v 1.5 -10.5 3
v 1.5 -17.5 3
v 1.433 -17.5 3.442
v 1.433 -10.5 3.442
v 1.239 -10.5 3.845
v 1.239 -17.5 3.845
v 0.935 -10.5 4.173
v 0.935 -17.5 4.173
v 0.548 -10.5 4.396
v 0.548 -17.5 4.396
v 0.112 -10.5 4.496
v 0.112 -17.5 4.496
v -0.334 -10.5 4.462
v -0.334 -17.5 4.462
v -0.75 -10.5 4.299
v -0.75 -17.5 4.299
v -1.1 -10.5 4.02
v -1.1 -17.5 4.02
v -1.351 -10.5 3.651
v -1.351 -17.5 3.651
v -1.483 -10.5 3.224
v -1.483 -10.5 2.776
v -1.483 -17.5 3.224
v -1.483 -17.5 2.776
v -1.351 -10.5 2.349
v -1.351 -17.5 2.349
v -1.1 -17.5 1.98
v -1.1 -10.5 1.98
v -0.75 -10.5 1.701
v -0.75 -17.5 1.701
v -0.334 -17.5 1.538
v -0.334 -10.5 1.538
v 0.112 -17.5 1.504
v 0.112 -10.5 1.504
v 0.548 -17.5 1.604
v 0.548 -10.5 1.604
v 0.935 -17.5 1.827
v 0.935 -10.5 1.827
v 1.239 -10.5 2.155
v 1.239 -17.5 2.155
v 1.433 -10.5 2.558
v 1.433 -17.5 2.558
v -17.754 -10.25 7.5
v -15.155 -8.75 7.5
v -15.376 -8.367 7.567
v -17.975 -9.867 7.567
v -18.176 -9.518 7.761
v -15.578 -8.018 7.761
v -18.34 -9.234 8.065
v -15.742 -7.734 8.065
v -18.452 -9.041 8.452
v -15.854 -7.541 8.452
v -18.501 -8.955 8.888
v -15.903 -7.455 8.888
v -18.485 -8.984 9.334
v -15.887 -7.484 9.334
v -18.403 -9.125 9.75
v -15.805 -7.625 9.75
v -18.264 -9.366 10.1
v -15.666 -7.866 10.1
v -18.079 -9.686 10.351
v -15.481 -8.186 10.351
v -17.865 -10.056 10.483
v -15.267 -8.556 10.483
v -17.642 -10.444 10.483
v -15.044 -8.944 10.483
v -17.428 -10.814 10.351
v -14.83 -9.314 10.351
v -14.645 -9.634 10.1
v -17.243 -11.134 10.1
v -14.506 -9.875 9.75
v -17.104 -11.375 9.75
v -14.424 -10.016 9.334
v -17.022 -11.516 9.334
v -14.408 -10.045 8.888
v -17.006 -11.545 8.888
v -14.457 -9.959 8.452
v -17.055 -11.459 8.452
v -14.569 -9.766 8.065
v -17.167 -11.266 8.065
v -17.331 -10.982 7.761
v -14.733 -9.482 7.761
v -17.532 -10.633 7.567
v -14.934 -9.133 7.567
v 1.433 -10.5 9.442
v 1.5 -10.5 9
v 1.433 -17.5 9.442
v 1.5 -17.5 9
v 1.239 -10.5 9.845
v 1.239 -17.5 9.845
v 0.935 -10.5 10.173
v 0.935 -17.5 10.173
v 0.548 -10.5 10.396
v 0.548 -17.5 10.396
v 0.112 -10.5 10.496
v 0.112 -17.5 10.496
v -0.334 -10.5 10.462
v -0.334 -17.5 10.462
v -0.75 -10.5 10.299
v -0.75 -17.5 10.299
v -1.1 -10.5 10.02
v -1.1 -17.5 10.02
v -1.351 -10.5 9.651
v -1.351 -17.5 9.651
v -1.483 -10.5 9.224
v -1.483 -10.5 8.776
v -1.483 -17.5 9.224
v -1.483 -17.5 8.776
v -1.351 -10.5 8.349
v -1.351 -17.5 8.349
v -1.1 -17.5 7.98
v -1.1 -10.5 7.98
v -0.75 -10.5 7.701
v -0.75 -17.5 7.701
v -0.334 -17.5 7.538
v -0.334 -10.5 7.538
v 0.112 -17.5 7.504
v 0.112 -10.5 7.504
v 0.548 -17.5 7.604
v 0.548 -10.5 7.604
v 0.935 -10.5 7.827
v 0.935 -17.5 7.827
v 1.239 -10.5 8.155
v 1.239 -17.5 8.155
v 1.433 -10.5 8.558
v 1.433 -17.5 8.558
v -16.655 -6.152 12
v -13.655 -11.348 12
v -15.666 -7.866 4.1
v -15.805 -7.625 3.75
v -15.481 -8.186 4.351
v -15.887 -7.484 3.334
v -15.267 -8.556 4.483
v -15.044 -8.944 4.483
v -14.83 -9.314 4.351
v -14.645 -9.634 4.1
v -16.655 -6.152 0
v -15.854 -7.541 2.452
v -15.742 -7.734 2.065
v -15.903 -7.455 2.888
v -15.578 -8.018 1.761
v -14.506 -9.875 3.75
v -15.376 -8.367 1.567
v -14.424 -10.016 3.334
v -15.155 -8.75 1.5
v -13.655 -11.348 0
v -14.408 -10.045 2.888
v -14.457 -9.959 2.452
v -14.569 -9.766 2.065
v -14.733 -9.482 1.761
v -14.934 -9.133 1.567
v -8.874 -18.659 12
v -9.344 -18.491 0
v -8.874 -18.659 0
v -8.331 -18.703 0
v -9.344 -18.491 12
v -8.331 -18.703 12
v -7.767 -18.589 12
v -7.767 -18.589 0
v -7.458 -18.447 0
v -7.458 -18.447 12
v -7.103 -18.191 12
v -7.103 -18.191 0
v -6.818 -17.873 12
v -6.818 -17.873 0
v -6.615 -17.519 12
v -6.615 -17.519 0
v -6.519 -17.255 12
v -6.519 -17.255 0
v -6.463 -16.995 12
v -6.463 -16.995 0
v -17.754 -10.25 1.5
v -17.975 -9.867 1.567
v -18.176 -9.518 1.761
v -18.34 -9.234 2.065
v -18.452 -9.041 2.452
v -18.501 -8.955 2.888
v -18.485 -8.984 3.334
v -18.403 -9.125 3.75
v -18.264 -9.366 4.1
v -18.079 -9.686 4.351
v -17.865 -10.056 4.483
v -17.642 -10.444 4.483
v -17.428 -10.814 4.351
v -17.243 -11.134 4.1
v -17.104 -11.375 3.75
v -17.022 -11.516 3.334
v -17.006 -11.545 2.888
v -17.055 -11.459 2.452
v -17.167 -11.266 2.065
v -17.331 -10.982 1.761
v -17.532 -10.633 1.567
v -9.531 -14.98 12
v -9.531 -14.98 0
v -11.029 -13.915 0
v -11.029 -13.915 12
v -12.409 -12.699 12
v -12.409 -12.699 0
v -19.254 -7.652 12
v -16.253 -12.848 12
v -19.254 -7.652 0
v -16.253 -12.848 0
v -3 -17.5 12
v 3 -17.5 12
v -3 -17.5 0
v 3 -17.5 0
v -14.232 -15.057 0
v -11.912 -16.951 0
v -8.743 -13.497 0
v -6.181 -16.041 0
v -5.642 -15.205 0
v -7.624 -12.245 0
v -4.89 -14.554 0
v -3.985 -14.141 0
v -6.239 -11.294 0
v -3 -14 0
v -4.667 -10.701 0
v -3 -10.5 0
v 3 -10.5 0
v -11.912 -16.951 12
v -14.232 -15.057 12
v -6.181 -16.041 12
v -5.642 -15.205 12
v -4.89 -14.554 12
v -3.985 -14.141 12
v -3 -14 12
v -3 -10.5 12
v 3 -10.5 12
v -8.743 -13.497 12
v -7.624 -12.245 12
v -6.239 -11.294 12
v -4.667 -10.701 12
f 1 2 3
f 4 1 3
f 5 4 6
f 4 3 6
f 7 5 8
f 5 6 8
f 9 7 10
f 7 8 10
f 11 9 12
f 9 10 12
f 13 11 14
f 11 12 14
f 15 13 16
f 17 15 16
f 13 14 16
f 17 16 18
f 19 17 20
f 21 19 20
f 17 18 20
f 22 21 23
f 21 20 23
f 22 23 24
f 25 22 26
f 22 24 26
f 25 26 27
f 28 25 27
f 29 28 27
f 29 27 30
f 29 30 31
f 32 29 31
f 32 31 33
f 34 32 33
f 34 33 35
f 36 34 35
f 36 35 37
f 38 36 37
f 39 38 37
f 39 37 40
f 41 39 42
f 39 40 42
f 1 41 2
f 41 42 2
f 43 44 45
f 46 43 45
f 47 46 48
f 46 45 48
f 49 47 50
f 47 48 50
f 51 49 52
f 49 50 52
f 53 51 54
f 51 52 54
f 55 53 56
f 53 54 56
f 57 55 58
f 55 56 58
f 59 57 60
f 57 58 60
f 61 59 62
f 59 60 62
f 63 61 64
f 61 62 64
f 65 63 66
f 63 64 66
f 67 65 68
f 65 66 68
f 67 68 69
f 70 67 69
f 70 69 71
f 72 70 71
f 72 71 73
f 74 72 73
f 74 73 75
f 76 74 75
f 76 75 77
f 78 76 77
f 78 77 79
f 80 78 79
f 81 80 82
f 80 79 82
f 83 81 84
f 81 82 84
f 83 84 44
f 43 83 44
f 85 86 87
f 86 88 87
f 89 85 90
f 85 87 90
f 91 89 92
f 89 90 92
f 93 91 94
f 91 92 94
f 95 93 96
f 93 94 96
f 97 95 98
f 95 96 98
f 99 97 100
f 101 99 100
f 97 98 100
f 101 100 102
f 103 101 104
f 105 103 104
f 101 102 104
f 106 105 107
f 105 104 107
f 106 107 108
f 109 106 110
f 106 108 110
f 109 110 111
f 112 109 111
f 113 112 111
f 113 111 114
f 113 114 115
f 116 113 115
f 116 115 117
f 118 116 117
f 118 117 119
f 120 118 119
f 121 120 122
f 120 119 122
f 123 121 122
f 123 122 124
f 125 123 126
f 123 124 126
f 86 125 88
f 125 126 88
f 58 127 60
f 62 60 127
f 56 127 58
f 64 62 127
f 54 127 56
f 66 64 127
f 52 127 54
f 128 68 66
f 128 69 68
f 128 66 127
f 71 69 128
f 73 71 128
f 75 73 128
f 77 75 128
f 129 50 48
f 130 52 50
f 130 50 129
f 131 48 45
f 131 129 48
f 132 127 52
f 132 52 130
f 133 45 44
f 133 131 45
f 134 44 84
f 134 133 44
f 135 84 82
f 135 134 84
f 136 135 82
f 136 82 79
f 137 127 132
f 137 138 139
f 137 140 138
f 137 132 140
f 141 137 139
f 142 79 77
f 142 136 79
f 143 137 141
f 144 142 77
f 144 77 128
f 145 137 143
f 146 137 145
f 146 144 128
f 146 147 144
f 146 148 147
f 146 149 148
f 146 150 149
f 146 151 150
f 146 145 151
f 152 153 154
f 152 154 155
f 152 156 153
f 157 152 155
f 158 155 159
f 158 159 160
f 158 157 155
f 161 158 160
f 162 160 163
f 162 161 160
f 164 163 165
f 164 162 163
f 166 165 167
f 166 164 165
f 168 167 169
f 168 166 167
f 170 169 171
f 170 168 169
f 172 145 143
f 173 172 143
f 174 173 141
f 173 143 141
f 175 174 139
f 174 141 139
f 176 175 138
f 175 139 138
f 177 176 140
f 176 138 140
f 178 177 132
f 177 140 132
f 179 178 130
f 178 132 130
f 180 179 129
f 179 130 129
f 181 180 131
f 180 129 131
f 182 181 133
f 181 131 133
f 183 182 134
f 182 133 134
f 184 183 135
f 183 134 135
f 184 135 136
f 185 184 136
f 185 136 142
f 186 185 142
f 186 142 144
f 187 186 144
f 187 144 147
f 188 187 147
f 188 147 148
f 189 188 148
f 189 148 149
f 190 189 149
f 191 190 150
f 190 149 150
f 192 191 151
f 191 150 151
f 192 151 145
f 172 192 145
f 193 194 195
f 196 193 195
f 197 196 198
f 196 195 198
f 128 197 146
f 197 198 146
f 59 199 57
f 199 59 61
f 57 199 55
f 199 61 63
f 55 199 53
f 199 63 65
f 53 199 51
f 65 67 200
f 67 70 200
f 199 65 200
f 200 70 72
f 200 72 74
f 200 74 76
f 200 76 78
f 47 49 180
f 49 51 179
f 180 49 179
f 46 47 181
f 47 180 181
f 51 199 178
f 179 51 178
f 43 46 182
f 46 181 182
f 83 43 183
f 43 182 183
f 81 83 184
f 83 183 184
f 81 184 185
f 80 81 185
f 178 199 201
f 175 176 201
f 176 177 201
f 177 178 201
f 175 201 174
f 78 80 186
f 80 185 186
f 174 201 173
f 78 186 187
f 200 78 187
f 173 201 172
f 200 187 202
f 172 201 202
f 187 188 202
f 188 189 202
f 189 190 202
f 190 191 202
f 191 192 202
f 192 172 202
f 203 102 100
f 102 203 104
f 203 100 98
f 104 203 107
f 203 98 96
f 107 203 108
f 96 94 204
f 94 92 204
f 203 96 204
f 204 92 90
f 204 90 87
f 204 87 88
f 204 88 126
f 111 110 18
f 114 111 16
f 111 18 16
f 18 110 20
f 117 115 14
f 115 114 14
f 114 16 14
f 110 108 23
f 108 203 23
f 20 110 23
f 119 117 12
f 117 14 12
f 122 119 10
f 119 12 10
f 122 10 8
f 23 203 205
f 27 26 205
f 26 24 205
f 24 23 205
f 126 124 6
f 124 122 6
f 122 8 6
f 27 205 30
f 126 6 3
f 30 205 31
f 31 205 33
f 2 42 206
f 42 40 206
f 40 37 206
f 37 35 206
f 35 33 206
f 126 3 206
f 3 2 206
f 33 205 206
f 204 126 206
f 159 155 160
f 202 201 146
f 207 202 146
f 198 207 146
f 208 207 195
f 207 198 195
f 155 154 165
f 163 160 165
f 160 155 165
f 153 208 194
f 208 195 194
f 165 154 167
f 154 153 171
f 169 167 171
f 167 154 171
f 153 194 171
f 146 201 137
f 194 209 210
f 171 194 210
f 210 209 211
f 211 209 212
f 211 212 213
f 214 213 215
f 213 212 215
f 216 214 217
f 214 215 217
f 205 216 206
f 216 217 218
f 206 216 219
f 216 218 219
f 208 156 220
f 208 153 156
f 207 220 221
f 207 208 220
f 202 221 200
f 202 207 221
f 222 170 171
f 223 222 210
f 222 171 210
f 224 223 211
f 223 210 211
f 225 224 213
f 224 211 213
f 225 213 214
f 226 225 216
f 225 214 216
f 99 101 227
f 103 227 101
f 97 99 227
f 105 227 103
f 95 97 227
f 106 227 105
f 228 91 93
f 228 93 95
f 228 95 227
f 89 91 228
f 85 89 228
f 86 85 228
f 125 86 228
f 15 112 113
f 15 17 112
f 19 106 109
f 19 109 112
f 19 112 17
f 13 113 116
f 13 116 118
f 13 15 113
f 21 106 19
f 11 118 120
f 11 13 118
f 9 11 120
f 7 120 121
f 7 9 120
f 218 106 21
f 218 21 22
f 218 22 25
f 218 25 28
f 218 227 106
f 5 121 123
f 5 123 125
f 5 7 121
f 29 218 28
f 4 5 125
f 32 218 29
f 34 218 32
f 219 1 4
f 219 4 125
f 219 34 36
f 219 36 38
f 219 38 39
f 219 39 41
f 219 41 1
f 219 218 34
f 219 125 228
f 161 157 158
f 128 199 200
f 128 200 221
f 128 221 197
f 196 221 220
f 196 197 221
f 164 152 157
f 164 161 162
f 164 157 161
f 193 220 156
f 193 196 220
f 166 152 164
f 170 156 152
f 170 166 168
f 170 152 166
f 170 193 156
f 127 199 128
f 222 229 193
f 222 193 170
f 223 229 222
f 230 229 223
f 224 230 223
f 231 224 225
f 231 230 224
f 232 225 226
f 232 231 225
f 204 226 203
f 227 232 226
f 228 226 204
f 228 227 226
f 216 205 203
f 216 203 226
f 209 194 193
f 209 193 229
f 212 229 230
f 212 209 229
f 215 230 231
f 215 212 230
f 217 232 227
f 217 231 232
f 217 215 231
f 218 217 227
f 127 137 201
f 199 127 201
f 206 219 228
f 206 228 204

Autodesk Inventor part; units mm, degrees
ref_plane "YZ Plane" through (0, 0, 0) normal (1, 0, 0) x (0, 1, 0)
ref_plane "XZ Plane" through (0, 0, 0) normal (0, 1, 0) x (-1, 0, 0)
ref_plane "XY Plane" through (0, 0, 0) normal (0, 0, 1) x (1, 0, 0)
sketch "Sketch1" plane through (0, 0, 0) normal (0, 0, 1) x (1, 0, 0)
  circle A0 centre (0, 0) radius 17.5
  line L0 (-15.1554, -8.75) -> (-13.6554, -11.3481)
  line L1 (-15.1554, -8.75) -> (-16.6554, -6.1519)
  line L2 (-16.6554, -6.1519) -> (-19.2535, -7.6519)
  line L3 (-19.2535, -7.6519) -> (-16.2535, -12.8481)
  line L4 (0, 0) -> (0, -17.5)
  line L5 (0, 0) -> (15.1554, -8.75)
  line L6 (0, 0) -> (17.5, 0) construction
  line L7 (0, 0) -> (17.5, 0) construction
  line L8 (0, 17.5) -> (0, -17.5)
  line L9 (-15.1554, -8.75) -> (0, 0)
  line L10 (0, -17.5) -> (3, -17.5)
  line L11 (3, -17.5) -> (3, -20.5)
  line L12 (-3, -17.5) -> (0, -17.5)
  arc A1 (-16.2535, -12.8481) -> (-3, -20.5) centre (0, 0) ccw
  line L13 (-3, -17.5) -> (-3, -14)
  line L14 (-3, -10.5) -> (3, -10.5)
  line L15 (3, -10.5) -> (3, -17.5)
  arc A2 (-3, -10.5) -> (-9.5308, -14.9804) centre (-3, -17.5) ccw
  arc A3 (-3, -14) -> (-5.4652, -19.9845) centre (-3, -17.5) ccw
  arc A4 (-13.6554, -11.3481) -> (-9.5308, -14.9804) centre (0, 0) ccw
  arc A5 (-6.3746, -16.5715) -> (-3, -17.5) centre (0, 0) ccw
  point P0 (0, -10.5)
  point P1 (-3, -17.2409)
  point P2 (3, -17.2409)
  dimension "d0" = 35
  dimension "d1" = 3
  dimension "d2" = 3
  dimension "d3" = 3
  dimension "d4" = 330
  dimension "d6" = 35
  dimension "d8" = 3
  dimension "d9" = 3
  dimension "d10" = 6
  dimension "d11" = 3
  dimension "d29" = 7
  dimension "d30" = 6
extrude "Extrusion1" add sketch "Sketch1" along normal blind 12 contours L0 A4 A2 A0 A3 A1 L3 L2 L1 | L15 L10 A0 | A0 L4 L14 L15 | A2 L14 L4 A0 L13 A3 | L12 L13 A0
sketch "Sketch2" plane through (-16.6554, -6.1519, 12) normal (0.866, 0.5, 0) x (0, 0, -1)
  line L0 (0, 0) -> (0, -3)
  line L1 (12, -6) -> (0, -6) projected
  line L2 (0, -3) -> (12, -3)
  line L3 (0, -3) -> (3, -3)
  line L4 (3, -3) -> (9, -3)
  circle A0 centre (3, -3) radius 1.5
  circle A1 centre (9, -3) radius 1.5
  dimension "d14" = 3
  dimension "d15" = 3
  dimension "d16" = 6
  dimension "d17" = 3
  dimension "d18" = 3
extrude "Extrusion2" cut sketch "Sketch2" against normal blind 12
sketch "Sketch3" plane through (-3, -17.5, 0) normal (0, -1, 0) x (1, 0, 0)
  line L0 (6, 12) -> (0, 12) projected
  line L1 (3, 0) -> (3, 3)
  line L2 (3, 3) -> (3, 9)
  circle A0 centre (3, 3) radius 1.5
  circle A1 centre (3, 9) radius 1.5
  dimension "d23" = 3
  dimension "d24" = 6
  dimension "d25" = 3
  dimension "d26" = 3
extrude "Extrusion3" cut sketch "Sketch3" against normal blind 12
fillet "Fillet1" radius 2 1 edges at (-5.4652, -19.9845, 6)
properties part number "acople" material "Iron, Ductile"
